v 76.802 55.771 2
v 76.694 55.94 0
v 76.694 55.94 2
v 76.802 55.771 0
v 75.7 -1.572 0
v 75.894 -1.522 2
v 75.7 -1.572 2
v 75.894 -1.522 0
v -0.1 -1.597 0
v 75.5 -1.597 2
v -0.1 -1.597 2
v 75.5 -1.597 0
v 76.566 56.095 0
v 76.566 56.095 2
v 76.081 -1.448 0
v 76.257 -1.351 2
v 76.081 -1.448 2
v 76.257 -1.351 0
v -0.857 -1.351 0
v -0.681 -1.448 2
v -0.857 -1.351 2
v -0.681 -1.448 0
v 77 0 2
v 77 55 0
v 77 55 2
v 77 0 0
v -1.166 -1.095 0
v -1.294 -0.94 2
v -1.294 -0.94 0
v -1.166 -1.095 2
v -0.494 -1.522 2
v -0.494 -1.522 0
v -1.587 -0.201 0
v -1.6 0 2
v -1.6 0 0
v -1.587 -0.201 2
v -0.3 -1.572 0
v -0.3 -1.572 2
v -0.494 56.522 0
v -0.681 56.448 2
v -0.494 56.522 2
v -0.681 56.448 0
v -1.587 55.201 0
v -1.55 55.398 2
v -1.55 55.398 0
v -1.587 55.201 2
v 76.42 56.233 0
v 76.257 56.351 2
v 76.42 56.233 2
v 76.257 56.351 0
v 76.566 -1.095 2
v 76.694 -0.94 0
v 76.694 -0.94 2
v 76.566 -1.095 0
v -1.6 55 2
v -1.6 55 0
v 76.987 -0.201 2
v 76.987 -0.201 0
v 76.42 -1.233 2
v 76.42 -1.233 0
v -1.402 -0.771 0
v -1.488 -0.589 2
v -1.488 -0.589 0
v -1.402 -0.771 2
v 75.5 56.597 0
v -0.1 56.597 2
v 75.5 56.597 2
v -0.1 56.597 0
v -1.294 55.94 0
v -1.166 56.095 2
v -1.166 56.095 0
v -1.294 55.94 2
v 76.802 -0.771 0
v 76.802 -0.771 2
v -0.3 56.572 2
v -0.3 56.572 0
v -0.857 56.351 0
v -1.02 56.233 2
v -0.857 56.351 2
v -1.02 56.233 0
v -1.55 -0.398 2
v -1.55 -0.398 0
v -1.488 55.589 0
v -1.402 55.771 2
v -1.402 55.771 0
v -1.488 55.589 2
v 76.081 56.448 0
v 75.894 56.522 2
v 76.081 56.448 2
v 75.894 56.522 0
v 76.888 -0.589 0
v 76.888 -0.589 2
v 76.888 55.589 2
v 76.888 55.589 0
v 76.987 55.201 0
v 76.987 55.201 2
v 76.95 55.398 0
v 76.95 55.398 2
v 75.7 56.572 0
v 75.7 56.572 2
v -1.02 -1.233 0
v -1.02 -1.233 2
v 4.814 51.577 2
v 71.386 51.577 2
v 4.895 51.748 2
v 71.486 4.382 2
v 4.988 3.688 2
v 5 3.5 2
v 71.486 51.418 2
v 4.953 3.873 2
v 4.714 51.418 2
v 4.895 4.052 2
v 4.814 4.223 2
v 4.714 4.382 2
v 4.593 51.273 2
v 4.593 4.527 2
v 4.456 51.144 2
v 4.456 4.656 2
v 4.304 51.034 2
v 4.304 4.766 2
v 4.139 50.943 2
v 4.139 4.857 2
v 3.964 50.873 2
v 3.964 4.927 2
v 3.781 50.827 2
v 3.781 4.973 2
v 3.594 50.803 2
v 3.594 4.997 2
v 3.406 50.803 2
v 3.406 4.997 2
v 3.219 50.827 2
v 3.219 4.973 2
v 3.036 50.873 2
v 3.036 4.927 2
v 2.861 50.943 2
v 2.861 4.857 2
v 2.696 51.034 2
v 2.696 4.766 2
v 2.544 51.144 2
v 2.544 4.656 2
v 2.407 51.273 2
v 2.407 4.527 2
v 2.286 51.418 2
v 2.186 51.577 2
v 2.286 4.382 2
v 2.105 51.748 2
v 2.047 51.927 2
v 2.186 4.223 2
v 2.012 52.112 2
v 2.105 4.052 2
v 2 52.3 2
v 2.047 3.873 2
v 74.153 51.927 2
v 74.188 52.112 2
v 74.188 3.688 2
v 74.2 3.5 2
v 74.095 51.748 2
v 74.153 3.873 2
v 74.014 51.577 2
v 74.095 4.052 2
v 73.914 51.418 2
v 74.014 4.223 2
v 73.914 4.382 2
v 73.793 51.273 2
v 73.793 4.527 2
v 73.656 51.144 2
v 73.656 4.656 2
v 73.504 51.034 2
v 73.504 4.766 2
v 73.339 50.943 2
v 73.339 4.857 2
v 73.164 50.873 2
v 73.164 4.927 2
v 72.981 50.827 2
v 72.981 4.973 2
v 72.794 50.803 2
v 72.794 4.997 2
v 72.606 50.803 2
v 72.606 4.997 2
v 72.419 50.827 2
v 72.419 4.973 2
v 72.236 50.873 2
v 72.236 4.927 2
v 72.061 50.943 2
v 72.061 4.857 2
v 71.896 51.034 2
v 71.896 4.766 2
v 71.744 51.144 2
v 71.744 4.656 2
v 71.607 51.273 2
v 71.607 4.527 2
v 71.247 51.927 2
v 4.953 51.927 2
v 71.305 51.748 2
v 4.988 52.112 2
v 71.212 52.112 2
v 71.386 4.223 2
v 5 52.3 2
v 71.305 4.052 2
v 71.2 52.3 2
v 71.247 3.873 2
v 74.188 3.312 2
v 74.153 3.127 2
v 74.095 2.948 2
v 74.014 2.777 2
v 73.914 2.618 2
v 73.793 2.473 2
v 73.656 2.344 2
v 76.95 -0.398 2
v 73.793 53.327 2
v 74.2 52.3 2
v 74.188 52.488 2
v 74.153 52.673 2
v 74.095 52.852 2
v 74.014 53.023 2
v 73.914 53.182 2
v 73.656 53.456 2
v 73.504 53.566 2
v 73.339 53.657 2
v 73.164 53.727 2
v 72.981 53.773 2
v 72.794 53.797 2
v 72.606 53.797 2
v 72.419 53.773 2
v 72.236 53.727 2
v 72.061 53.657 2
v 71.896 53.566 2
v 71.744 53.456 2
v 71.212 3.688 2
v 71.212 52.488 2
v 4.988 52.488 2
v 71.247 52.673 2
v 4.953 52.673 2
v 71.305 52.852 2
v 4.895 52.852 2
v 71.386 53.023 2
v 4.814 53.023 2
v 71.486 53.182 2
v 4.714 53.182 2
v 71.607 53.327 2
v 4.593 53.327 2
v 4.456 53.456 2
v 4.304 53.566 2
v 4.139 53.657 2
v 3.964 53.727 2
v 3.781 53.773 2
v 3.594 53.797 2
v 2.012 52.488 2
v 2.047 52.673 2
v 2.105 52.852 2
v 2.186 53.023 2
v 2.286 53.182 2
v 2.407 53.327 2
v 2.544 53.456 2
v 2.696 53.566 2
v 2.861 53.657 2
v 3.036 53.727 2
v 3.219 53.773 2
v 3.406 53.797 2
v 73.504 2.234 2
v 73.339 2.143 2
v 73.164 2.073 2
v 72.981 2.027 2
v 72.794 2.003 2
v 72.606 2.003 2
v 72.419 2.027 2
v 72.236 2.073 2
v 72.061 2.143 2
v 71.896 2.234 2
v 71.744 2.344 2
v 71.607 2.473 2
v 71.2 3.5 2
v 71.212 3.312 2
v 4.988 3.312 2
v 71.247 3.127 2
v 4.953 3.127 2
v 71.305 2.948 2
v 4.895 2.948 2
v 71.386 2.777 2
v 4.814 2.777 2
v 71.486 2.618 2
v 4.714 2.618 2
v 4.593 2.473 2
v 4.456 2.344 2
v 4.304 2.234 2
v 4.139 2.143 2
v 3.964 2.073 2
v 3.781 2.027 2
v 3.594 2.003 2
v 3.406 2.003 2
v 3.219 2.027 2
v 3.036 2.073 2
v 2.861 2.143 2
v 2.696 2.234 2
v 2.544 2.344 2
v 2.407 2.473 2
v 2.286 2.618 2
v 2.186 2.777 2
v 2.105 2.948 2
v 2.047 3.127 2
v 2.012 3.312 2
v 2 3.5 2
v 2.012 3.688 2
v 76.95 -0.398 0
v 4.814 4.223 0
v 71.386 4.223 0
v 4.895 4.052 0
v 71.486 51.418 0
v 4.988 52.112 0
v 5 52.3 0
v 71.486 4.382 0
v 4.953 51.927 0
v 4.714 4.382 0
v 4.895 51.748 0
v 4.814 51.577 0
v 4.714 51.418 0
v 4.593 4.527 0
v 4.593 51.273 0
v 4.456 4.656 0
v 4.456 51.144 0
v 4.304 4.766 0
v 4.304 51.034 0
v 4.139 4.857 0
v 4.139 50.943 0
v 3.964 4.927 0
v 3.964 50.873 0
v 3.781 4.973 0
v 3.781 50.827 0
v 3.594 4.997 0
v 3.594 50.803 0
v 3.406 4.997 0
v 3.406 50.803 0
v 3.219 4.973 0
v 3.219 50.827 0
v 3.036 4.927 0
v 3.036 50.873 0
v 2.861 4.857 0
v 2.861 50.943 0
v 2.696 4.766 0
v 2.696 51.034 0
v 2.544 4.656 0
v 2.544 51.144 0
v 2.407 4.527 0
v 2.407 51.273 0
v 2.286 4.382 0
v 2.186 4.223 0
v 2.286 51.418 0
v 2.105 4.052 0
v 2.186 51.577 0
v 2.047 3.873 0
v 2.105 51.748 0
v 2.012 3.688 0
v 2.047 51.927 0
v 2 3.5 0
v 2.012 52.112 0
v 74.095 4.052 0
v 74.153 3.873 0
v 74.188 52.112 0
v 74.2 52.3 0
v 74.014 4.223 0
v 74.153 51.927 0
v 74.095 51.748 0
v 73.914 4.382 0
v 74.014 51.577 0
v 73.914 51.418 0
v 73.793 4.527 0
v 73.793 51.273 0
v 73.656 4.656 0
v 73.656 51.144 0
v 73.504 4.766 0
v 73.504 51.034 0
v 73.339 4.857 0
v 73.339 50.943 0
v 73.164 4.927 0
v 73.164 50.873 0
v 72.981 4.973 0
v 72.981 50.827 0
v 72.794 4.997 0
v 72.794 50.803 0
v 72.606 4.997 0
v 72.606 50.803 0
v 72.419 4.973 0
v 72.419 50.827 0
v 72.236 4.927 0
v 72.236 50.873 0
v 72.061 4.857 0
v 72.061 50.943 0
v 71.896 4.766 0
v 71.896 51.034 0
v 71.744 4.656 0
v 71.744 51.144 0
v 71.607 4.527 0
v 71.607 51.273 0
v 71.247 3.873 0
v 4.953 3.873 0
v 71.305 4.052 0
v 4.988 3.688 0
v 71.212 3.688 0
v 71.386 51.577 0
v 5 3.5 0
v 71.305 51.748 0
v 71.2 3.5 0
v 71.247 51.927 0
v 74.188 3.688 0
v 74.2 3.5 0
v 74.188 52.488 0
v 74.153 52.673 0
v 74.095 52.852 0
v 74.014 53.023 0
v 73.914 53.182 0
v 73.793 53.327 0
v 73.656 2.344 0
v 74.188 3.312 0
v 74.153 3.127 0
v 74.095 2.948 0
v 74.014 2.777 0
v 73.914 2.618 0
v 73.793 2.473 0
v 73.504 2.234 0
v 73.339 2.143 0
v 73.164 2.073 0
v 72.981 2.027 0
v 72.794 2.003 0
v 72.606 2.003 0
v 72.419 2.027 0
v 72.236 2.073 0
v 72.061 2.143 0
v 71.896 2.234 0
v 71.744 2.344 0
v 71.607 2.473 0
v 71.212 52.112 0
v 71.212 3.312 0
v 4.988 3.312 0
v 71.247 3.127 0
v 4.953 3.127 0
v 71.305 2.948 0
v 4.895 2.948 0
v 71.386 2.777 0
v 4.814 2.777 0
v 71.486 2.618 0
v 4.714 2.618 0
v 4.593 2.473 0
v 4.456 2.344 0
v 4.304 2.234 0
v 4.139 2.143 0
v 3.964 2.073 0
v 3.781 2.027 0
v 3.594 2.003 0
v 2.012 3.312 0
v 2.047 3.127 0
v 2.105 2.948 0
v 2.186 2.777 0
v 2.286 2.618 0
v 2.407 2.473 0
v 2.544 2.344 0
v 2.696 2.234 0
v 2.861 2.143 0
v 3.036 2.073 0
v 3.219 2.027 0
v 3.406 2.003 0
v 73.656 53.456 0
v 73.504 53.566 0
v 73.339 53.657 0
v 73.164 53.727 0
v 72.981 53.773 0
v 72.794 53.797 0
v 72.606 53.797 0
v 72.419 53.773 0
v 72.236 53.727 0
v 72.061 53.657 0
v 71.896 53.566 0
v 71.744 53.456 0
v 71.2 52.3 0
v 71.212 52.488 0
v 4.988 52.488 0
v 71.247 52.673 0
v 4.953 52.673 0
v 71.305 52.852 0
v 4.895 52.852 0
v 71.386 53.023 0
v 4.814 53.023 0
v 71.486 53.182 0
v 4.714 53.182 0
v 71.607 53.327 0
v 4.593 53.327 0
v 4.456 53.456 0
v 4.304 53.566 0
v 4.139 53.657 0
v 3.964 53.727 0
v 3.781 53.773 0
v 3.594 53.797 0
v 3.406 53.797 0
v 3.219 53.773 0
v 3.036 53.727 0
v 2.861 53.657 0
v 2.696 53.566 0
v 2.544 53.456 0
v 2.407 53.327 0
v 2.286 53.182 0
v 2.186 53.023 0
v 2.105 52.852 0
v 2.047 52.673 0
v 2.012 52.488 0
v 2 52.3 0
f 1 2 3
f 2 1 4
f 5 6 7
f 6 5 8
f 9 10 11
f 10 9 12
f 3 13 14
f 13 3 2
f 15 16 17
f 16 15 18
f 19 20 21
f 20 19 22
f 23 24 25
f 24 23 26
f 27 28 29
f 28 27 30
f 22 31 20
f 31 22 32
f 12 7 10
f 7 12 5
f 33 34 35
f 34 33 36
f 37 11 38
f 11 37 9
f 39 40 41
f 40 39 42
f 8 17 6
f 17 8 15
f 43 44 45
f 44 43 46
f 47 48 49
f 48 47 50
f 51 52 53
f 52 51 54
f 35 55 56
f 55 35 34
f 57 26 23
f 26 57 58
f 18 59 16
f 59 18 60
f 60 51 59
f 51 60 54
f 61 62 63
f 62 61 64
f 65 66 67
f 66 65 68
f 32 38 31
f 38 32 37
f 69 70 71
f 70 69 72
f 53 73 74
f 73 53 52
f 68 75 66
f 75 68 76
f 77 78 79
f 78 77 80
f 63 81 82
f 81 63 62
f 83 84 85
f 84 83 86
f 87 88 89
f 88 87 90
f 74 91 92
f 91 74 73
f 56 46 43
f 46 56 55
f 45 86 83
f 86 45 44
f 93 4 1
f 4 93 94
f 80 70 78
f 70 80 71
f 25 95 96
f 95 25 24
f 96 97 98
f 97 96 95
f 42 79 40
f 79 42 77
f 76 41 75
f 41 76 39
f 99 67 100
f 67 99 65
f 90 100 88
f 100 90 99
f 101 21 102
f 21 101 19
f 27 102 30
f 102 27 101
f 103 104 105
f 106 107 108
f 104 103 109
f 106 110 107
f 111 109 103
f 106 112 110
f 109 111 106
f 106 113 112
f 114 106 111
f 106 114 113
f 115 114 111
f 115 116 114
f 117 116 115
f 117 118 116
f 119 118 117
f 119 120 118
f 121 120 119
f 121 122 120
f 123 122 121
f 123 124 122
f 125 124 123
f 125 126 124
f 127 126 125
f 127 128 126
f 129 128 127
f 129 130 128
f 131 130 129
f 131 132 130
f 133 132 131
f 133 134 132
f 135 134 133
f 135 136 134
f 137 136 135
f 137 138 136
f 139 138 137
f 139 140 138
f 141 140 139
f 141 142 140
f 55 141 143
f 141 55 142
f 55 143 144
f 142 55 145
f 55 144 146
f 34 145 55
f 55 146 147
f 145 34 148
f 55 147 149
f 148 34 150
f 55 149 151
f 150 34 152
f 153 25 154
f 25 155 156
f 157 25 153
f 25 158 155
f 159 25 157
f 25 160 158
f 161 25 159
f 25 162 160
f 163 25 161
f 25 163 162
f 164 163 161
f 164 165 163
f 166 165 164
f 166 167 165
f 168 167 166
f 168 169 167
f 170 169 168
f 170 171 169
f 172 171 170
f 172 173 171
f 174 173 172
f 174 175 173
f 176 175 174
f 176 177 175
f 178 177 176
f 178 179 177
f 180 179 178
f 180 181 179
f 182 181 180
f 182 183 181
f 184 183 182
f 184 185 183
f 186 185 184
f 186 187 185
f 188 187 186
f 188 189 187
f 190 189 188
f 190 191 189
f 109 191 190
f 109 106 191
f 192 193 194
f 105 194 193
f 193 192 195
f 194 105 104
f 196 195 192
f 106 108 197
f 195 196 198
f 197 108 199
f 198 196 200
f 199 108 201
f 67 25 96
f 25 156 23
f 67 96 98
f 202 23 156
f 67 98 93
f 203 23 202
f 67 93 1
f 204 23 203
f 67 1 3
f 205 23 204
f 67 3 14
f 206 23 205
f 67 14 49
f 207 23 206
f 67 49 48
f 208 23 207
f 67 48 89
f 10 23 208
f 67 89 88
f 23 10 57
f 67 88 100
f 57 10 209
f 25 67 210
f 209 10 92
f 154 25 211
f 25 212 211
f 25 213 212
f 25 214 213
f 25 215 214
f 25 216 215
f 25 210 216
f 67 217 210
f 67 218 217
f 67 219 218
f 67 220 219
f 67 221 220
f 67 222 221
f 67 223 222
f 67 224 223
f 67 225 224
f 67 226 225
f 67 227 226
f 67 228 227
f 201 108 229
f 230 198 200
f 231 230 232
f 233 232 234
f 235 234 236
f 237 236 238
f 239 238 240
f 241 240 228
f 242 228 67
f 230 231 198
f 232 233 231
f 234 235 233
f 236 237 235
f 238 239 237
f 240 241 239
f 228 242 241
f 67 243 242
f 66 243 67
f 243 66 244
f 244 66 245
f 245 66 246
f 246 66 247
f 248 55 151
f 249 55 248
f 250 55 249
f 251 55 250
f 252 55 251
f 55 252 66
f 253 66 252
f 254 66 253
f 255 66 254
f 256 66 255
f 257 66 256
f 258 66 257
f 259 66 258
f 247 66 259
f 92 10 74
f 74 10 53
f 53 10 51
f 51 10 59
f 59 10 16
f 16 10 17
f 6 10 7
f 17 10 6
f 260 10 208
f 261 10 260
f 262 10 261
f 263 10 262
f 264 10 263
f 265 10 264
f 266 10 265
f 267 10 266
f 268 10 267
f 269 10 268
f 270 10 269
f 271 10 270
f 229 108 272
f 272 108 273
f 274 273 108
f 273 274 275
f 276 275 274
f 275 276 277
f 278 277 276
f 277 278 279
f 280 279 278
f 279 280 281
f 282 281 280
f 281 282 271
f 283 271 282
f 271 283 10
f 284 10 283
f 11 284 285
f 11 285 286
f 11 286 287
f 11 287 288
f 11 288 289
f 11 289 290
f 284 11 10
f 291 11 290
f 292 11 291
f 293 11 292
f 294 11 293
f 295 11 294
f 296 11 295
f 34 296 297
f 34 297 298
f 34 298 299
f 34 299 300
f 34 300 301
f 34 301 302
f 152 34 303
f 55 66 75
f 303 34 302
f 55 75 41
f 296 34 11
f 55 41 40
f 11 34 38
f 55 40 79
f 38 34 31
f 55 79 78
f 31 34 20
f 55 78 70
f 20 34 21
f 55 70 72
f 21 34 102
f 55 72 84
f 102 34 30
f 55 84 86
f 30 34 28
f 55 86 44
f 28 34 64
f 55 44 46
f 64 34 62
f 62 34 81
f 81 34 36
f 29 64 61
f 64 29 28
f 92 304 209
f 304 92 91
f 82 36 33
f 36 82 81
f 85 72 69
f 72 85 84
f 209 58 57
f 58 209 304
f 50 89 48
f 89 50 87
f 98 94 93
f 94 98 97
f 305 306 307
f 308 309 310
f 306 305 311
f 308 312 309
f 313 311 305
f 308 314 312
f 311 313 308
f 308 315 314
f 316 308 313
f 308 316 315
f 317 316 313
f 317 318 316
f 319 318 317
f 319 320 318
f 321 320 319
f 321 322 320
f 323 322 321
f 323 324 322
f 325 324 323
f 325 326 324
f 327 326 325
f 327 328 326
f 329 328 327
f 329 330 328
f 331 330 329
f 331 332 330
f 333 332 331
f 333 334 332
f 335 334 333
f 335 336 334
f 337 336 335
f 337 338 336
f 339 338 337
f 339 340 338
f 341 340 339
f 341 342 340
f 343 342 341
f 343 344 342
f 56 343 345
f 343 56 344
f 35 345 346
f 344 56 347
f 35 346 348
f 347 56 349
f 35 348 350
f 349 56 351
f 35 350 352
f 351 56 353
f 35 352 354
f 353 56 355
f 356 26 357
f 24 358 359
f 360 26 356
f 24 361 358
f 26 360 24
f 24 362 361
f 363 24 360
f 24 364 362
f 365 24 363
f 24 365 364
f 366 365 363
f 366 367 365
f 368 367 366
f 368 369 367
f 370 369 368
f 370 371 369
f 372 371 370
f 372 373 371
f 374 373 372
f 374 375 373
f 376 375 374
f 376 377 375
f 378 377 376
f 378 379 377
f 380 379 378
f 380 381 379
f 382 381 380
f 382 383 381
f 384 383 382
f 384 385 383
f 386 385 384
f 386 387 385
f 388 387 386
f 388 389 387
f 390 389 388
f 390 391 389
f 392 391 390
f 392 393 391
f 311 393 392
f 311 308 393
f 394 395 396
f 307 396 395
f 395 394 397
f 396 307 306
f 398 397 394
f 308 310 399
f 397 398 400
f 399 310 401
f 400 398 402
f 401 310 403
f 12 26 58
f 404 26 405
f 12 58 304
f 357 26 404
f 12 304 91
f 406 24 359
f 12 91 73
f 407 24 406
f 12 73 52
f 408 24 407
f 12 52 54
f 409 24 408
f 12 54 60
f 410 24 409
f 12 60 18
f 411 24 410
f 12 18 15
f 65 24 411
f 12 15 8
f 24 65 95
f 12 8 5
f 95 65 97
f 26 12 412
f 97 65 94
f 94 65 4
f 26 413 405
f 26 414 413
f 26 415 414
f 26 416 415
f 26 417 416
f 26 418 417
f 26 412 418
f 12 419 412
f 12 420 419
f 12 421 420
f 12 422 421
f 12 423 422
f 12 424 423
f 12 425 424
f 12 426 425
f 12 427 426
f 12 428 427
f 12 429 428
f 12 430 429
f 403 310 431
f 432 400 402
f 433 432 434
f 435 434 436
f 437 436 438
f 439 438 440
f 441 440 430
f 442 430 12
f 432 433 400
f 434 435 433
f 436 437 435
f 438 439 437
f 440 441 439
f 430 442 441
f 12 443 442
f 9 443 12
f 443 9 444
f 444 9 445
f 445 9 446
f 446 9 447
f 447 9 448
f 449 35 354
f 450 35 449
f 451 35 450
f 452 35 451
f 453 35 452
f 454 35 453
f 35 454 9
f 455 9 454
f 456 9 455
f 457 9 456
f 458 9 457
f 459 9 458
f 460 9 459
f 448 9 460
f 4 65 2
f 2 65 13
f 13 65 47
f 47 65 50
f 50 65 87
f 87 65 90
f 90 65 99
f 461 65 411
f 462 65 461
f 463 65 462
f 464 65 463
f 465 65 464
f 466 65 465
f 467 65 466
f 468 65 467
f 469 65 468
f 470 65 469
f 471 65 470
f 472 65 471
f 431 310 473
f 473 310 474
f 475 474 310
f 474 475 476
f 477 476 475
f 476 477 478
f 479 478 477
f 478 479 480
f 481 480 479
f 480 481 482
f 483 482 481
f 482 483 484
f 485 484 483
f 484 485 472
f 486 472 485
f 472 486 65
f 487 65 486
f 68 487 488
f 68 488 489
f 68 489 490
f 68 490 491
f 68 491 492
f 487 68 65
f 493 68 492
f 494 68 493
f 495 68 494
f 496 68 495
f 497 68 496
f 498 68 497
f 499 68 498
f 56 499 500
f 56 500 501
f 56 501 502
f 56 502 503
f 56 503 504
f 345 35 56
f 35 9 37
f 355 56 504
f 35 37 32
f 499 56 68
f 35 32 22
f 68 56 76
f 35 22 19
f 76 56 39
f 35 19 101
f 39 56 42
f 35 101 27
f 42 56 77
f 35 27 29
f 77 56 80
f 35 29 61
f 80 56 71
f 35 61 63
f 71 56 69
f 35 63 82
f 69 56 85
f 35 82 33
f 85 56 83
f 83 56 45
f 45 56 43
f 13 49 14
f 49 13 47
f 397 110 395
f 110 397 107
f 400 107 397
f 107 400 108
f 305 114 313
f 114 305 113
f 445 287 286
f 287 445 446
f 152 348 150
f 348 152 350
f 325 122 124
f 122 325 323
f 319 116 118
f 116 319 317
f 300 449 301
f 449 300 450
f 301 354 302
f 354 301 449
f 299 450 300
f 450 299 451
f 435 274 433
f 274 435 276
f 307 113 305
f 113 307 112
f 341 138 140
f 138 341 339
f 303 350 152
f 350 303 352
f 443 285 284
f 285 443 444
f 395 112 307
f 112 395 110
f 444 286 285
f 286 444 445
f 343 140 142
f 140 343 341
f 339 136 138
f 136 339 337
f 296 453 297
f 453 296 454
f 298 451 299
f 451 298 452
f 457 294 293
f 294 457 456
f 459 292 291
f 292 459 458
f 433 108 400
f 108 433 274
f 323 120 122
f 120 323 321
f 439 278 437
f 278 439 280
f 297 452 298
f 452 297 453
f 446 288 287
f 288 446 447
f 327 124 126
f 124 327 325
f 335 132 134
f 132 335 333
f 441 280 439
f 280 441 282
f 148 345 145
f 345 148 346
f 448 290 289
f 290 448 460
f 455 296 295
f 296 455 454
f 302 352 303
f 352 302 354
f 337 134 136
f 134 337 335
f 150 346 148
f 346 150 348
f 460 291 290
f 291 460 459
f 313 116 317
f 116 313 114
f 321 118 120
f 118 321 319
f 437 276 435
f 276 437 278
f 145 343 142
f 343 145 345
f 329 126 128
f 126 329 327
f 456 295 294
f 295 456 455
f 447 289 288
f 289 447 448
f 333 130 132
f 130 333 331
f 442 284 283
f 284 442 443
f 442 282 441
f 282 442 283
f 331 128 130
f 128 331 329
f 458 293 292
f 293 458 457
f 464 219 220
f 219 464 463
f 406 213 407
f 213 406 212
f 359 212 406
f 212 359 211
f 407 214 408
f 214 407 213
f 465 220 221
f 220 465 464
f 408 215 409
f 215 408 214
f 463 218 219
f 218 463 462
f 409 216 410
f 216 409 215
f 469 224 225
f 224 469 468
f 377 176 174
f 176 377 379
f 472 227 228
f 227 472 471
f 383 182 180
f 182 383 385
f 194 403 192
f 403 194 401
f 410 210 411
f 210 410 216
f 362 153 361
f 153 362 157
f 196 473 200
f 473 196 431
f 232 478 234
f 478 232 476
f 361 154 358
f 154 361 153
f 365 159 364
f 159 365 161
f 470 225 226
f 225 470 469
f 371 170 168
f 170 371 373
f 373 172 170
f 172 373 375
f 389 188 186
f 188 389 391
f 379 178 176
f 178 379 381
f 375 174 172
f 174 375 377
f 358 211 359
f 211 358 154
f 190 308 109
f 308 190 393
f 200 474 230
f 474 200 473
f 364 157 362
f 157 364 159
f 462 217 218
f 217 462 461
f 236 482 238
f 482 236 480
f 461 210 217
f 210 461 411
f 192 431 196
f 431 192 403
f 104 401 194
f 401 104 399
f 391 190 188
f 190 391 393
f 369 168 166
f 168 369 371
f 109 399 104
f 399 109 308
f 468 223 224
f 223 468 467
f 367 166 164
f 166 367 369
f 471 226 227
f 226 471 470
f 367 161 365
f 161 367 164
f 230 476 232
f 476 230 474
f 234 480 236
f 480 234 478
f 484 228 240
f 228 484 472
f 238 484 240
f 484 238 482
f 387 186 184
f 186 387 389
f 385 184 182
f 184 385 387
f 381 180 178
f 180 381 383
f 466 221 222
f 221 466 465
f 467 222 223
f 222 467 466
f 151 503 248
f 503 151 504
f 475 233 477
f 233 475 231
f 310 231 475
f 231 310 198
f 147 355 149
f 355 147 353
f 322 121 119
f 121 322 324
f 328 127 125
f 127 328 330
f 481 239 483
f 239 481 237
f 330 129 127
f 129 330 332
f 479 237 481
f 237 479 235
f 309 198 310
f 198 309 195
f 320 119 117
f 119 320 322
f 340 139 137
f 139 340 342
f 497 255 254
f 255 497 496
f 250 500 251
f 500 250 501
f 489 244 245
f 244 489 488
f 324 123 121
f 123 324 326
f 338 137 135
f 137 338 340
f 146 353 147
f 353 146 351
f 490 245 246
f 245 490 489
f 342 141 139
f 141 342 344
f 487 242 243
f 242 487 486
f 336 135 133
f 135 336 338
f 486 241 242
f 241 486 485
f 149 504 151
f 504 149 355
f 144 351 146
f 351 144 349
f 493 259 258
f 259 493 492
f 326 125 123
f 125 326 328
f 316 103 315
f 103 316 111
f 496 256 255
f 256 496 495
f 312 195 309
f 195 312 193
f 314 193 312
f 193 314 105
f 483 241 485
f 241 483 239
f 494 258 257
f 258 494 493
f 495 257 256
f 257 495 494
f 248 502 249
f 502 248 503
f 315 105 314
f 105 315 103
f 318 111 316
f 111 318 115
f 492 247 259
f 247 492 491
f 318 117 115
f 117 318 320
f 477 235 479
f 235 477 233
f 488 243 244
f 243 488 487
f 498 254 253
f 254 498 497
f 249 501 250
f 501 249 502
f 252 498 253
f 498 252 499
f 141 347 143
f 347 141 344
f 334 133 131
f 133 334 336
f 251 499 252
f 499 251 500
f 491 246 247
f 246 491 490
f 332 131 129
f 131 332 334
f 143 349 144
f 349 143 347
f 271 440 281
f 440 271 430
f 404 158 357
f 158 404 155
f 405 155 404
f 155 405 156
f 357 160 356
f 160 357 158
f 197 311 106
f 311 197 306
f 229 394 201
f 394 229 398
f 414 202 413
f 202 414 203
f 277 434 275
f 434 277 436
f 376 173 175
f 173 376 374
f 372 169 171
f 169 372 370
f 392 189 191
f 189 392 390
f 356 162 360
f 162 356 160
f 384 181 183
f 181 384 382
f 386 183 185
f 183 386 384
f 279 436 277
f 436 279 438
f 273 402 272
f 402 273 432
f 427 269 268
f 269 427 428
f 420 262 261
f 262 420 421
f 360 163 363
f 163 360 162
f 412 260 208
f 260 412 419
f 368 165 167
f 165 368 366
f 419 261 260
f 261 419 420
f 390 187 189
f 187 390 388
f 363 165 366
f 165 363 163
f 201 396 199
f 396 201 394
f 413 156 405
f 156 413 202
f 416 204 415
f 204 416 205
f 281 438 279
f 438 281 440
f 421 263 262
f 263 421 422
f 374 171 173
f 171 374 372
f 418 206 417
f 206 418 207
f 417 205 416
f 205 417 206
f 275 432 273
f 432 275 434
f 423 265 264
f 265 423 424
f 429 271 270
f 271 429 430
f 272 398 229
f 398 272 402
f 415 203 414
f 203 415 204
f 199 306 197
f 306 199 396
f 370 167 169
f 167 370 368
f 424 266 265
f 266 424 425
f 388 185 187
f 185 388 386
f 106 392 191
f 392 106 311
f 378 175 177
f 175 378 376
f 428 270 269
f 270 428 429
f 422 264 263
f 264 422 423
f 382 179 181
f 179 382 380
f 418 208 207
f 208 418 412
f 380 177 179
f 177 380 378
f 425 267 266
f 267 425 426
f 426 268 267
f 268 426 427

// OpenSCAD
$fn=50;

module miniround(size, radius) {
    x = size[0]-radius/2;
    y = size[1]-radius/2;

    minkowski()
    {
        cube(size=[x,y,size[2]]);
        cylinder(r=radius);
        // Using a sphere is possible, but will kill performance
        //sphere(r=radius);
    }
}

//cube([76.2,55.8,1.6]);
height=1.6;
width=76.2;
depth=55.8;

difference() {
    miniround([width,depth],height);
    translate([3.5,3.5,0]) {
        cylinder(h=height*2,d=3);
    }
    translate([width-3.5,depth-3.5]) {
        cylinder(h=height*2,d=3);
    }
    translate([3.5,depth-3.5]) {
        cylinder(h=height*2,d=3);
    }
    translate([width-3.5,3.5]) {
        cylinder(h=height*2,d=3);
    }
}
